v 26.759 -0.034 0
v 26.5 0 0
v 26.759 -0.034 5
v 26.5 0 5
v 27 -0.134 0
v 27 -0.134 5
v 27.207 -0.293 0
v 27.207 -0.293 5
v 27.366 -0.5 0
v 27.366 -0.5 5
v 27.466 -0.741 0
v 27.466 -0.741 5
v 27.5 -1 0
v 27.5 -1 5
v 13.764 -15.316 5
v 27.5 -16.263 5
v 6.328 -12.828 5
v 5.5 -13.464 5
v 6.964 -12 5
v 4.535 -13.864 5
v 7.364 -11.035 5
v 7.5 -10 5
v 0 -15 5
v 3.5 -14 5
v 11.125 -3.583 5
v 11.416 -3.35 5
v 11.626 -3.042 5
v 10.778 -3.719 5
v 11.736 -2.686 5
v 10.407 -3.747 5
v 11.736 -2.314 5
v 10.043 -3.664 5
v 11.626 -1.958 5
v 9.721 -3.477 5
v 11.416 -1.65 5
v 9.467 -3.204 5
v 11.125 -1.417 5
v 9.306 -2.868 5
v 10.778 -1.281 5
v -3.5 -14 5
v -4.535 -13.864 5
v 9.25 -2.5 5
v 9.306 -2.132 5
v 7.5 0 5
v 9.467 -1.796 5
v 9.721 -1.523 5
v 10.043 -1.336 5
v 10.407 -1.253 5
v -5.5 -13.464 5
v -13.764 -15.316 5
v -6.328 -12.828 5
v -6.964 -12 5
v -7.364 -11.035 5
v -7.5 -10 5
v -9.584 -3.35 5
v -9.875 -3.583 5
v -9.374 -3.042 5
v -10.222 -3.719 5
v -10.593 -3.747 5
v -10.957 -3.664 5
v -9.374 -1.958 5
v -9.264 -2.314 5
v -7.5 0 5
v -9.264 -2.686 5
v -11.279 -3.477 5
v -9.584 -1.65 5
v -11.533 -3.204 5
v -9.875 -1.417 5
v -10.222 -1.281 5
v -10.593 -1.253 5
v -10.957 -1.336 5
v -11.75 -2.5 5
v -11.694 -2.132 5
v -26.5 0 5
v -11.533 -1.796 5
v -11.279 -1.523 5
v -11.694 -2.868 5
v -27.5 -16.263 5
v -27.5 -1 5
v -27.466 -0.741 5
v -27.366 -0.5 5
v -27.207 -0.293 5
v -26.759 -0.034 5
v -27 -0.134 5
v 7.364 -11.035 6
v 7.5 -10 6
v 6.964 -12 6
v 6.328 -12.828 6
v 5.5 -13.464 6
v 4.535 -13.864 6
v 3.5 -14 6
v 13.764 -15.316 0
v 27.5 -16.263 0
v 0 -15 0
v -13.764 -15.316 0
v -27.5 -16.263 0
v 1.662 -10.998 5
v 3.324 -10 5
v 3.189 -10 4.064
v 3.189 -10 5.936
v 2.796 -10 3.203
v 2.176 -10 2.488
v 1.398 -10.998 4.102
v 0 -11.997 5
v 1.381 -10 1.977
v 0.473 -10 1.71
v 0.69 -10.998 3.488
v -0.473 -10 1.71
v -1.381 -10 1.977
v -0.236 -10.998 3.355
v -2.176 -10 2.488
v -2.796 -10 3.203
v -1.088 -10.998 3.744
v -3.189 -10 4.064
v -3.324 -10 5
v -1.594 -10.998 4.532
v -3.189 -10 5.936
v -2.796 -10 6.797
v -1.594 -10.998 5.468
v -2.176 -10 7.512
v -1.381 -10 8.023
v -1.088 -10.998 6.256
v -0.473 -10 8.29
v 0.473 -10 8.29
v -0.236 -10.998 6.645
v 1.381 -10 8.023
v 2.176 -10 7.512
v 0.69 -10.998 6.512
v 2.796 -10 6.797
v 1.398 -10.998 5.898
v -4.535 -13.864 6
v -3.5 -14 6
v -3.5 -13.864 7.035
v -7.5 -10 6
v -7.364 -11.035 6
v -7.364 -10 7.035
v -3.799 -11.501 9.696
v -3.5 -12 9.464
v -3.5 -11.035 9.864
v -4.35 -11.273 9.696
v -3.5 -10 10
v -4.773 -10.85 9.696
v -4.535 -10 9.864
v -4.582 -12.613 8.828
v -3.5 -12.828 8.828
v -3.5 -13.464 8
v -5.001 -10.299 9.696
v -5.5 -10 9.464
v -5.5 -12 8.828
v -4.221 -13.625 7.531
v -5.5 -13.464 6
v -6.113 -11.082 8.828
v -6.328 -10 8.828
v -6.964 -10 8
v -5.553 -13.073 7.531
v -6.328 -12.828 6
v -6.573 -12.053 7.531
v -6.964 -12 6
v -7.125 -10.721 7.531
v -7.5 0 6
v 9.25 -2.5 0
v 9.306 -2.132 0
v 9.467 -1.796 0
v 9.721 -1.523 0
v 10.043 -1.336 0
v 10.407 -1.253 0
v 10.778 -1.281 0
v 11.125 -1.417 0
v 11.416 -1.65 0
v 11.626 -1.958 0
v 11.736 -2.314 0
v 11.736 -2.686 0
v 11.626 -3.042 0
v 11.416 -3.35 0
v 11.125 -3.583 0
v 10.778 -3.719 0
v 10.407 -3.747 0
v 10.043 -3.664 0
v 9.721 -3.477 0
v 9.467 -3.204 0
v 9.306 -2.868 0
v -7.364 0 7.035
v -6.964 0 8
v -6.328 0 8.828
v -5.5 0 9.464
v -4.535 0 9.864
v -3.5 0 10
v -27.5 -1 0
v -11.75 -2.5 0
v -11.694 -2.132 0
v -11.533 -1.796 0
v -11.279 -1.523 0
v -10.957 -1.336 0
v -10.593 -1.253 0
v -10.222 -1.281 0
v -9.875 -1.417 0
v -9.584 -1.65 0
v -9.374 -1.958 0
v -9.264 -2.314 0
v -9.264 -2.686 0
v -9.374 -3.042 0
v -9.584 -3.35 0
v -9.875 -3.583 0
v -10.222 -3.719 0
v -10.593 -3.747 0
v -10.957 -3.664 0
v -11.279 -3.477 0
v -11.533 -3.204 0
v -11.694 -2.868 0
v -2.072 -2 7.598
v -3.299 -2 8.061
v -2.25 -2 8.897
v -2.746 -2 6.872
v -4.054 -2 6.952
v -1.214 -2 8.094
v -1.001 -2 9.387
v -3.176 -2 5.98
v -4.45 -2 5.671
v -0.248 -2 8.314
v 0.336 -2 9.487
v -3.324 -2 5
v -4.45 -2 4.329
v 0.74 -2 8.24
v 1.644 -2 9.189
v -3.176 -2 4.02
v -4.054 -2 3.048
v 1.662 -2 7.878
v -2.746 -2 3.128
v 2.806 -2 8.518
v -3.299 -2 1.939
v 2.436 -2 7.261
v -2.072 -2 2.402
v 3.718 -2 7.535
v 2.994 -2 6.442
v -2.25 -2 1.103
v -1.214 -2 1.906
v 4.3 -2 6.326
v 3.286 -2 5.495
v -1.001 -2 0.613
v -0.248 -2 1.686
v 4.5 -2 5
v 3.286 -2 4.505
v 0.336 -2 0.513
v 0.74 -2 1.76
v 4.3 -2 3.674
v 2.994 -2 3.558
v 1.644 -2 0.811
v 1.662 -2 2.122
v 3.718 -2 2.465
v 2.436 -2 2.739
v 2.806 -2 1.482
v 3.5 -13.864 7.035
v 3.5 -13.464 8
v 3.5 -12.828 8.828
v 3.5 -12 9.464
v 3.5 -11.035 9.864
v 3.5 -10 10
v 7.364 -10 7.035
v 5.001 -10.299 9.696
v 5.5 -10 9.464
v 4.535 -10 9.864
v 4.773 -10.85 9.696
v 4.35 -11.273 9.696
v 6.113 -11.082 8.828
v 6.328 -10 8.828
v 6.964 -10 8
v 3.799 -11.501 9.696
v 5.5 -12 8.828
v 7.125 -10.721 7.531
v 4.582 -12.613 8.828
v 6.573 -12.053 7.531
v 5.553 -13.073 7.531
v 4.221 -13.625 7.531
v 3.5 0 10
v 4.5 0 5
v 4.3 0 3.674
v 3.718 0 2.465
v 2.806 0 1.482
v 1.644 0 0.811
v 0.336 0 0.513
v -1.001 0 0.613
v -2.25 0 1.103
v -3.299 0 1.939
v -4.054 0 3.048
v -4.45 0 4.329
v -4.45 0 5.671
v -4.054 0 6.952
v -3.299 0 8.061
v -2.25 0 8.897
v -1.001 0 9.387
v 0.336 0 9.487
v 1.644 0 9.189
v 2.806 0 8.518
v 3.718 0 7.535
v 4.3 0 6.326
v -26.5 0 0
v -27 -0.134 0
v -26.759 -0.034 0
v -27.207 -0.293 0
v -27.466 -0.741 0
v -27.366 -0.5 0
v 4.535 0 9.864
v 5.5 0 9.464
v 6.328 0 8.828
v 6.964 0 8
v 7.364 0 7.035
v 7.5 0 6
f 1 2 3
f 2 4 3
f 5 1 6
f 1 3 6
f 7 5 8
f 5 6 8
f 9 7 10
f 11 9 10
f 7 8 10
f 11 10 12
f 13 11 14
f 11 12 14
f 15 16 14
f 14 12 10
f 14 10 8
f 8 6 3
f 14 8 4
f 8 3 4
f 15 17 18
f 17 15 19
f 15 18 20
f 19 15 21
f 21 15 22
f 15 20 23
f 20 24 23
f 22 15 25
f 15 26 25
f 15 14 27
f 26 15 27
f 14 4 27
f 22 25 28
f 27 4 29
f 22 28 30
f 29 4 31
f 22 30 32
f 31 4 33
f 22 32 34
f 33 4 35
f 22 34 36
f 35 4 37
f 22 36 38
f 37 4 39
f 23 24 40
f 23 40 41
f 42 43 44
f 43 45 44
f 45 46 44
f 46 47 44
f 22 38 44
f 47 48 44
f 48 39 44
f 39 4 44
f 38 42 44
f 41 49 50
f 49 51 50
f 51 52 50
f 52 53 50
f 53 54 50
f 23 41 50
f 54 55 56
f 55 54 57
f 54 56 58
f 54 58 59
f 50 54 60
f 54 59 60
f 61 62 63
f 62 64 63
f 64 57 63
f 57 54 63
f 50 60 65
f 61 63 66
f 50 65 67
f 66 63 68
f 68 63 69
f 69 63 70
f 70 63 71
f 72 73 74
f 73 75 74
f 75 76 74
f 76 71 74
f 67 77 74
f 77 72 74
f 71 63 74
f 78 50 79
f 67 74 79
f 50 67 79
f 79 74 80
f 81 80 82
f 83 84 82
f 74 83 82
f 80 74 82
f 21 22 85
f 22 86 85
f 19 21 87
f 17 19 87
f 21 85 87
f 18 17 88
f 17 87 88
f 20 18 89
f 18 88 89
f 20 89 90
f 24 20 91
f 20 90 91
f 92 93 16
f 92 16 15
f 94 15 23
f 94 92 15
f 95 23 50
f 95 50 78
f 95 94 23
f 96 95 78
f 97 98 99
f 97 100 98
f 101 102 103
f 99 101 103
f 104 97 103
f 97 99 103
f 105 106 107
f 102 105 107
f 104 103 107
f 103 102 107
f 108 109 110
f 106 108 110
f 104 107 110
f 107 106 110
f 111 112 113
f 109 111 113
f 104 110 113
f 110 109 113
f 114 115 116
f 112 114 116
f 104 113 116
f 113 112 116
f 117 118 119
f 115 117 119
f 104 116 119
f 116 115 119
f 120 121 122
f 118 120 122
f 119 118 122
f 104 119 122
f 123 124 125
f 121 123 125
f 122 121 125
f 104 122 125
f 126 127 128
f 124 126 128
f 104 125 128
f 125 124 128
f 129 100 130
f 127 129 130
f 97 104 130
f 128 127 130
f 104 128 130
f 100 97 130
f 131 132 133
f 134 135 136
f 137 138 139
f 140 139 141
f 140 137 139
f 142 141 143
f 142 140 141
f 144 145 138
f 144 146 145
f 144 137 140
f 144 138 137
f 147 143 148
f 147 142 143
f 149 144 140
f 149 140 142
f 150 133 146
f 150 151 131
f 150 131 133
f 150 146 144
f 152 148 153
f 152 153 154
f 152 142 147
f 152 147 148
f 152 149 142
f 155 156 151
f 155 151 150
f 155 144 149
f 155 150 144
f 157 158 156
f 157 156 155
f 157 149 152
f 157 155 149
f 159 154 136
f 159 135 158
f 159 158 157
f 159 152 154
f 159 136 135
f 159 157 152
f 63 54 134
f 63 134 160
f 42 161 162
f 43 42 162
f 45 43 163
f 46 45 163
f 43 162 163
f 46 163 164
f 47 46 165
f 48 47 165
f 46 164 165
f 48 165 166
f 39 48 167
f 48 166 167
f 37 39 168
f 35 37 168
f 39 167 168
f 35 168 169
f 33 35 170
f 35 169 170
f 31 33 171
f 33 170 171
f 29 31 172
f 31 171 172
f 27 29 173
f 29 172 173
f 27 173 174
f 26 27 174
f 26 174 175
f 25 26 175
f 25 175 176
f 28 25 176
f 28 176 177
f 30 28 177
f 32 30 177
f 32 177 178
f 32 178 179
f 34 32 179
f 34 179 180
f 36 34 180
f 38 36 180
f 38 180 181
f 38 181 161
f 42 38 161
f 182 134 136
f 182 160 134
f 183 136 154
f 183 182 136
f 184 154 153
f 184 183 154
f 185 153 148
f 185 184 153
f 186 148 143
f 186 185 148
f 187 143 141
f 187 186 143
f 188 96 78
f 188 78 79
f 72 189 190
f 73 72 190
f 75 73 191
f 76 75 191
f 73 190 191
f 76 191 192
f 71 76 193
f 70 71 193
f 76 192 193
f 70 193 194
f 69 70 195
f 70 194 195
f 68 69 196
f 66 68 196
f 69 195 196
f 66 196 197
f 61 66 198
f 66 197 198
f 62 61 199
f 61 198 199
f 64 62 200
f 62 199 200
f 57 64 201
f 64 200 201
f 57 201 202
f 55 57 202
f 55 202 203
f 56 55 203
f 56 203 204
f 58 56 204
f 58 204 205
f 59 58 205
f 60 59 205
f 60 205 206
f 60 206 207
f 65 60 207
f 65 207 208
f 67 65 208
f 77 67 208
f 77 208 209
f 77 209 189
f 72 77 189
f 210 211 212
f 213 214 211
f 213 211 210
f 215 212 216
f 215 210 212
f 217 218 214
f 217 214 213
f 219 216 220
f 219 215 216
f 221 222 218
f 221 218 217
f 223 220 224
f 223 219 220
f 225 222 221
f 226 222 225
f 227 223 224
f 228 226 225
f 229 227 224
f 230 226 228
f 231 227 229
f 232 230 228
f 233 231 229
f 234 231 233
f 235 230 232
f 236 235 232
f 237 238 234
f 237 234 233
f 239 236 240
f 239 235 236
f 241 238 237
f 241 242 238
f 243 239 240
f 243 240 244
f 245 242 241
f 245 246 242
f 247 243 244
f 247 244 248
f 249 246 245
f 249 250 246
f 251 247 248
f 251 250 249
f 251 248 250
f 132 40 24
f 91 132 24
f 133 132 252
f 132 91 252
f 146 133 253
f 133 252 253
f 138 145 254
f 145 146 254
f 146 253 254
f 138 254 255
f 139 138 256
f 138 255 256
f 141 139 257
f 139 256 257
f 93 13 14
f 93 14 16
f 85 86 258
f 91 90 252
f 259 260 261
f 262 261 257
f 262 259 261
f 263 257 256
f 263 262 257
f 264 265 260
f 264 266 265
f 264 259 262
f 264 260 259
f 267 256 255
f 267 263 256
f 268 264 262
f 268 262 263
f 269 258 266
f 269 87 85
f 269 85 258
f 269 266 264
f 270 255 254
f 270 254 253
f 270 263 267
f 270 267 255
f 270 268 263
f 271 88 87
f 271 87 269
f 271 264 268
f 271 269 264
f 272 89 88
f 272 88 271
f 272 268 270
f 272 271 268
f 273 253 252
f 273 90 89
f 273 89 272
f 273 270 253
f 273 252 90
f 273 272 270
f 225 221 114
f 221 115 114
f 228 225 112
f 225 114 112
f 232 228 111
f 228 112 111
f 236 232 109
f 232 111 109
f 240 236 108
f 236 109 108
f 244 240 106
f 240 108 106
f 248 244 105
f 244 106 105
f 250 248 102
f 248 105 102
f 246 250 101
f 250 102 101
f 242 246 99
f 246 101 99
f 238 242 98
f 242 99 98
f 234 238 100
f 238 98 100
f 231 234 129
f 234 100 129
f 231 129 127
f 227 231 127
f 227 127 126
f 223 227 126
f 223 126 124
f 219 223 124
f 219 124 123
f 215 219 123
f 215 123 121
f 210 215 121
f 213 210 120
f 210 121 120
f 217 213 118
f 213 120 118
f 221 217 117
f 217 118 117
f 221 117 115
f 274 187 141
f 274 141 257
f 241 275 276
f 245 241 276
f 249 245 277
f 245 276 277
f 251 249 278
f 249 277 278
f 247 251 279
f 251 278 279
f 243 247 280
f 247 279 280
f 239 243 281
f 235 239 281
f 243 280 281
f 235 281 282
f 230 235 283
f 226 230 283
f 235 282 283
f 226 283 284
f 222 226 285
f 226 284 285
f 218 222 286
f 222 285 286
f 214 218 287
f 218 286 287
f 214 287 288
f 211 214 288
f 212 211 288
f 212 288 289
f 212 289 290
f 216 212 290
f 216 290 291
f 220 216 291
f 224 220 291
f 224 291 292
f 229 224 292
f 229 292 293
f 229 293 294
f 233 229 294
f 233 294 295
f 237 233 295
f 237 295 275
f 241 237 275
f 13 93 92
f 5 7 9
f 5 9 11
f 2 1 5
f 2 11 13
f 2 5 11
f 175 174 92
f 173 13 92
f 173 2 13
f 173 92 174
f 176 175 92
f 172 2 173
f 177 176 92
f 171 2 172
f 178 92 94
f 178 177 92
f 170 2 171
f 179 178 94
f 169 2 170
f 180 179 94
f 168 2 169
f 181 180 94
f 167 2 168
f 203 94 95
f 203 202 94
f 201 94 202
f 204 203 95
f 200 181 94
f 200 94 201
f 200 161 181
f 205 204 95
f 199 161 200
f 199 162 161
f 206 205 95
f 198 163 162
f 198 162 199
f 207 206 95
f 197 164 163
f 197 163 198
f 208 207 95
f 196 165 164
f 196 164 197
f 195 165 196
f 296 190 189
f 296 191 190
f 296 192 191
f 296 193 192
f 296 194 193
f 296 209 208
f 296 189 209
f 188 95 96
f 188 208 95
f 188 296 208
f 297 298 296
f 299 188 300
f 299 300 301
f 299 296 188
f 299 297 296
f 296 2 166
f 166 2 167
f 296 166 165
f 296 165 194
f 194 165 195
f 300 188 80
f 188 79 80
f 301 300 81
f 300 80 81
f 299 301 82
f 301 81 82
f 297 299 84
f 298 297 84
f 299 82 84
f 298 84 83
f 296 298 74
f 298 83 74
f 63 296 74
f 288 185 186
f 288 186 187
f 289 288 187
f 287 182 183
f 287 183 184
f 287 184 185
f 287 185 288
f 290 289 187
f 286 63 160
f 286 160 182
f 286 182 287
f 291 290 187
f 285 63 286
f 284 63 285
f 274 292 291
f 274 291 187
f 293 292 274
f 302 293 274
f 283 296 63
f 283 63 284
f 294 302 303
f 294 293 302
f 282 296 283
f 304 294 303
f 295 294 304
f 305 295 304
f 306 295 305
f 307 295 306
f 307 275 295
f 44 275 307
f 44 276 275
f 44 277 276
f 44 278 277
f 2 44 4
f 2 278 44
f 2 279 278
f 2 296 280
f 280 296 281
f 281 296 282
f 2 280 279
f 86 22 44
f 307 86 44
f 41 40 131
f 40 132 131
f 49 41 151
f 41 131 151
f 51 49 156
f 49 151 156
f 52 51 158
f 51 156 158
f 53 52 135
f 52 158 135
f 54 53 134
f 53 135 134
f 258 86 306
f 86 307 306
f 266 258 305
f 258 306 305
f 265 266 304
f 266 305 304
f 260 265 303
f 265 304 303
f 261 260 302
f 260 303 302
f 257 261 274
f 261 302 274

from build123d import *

# Parameters (mm, degrees)
BOSS_EXTRUDE1_DEPTH                     = 5
SKETCH4_W                               = 15
SKETCH4_H                               = 14
BOSS_EXTRUDE2_DEPTH                     = 5
CBORE_FOR_M6_HEX_HEAD_BOLT1_D           = 6.647
CBORE_FOR_M6_HEX_HEAD_BOLT1_DEPTH       = 10
CBORE_FOR_M6_HEX_HEAD_BOLT1_CBORE_D     = 9
CBORE_FOR_M6_HEX_HEAD_BOLT1_CBORE_DEPTH = 2
CBORE_FOR_M6_HEX_HEAD_BOLT1_TIP         = 1.996960267
FILLET1_R                               = 1
FILLET2_R                               = 4
TAP_DRILL_FOR_M3X0_5_TAP1_D             = 2.5


with BuildPart() as part:
    # Sketch1 → Boss-Extrude1 (new body)
    with BuildSketch(Plane(origin=(0, 0, 0), x_dir=(-1, 0, 0), z_dir=(0, 0, -1))):
        with BuildLine():
            Line((27.500000074, -16.263075607), (27.500000074, 0))
            Line((27.500000074, 0), (-27.5, 0))
            Line((-27.5, 0), (-27.5, -16.2630756))
            ThreePointArc((-27.5, -16.2630756), (3.7e-08, -15), (27.500000074, -16.263075607))
        make_face()
    extrude(amount=-BOSS_EXTRUDE1_DEPTH)

    # Sketch4 → Boss-Extrude2 (add)
    with BuildSketch(Plane.XY.offset(5)):
        with Locations((0, -7)):
            Rectangle(SKETCH4_W, SKETCH4_H)
    extrude(amount=BOSS_EXTRUDE2_DEPTH)

    # CBORE for M6 Hex Head Bolt1
    with Locations(Plane(origin=(0, 0, 0), x_dir=(1, 0, 0), z_dir=(0, 1, 0))):
        with Locations((0, -5)):
            CounterBoreHole(CBORE_FOR_M6_HEX_HEAD_BOLT1_D / 2, CBORE_FOR_M6_HEX_HEAD_BOLT1_CBORE_D / 2, CBORE_FOR_M6_HEX_HEAD_BOLT1_CBORE_DEPTH, depth=CBORE_FOR_M6_HEX_HEAD_BOLT1_DEPTH)
            with Locations((0, 0, -(CBORE_FOR_M6_HEX_HEAD_BOLT1_DEPTH + CBORE_FOR_M6_HEX_HEAD_BOLT1_TIP / 2))):  # 118° drill point
                Cone(0, CBORE_FOR_M6_HEX_HEAD_BOLT1_D / 2, CBORE_FOR_M6_HEX_HEAD_BOLT1_TIP, mode=Mode.SUBTRACT)

    # Fillet1
    fillet1_edges = [part.edges().sort_by_distance(p)[0] for p in [
        (27.5, 0, 2.5),
        (-27.500000074, 0, 2.5),
    ]]
    fillet(fillet1_edges, radius=FILLET1_R)

    # Fillet2
    fillet2_edges = [part.edges().sort_by_distance(p)[0] for p in [
        (7.5, -14, 7.5),
        (7.5, -7, 10),
        (-7.5, -14, 7.5),
        (0, -14, 10),
        (-7.5, -7, 10),
    ]]
    fillet(fillet2_edges, radius=FILLET2_R)

    # Tap Drill for M3x0.5 Tap1 (through all)
    with Locations(Plane(origin=(-10.5, -2.5, 5), x_dir=(1, 0, 0), z_dir=(0, 0, 1))):
        with Locations((0, 0), (21, 0)):
            Hole(TAP_DRILL_FOR_M3X0_5_TAP1_D / 2)


solid = part.part
